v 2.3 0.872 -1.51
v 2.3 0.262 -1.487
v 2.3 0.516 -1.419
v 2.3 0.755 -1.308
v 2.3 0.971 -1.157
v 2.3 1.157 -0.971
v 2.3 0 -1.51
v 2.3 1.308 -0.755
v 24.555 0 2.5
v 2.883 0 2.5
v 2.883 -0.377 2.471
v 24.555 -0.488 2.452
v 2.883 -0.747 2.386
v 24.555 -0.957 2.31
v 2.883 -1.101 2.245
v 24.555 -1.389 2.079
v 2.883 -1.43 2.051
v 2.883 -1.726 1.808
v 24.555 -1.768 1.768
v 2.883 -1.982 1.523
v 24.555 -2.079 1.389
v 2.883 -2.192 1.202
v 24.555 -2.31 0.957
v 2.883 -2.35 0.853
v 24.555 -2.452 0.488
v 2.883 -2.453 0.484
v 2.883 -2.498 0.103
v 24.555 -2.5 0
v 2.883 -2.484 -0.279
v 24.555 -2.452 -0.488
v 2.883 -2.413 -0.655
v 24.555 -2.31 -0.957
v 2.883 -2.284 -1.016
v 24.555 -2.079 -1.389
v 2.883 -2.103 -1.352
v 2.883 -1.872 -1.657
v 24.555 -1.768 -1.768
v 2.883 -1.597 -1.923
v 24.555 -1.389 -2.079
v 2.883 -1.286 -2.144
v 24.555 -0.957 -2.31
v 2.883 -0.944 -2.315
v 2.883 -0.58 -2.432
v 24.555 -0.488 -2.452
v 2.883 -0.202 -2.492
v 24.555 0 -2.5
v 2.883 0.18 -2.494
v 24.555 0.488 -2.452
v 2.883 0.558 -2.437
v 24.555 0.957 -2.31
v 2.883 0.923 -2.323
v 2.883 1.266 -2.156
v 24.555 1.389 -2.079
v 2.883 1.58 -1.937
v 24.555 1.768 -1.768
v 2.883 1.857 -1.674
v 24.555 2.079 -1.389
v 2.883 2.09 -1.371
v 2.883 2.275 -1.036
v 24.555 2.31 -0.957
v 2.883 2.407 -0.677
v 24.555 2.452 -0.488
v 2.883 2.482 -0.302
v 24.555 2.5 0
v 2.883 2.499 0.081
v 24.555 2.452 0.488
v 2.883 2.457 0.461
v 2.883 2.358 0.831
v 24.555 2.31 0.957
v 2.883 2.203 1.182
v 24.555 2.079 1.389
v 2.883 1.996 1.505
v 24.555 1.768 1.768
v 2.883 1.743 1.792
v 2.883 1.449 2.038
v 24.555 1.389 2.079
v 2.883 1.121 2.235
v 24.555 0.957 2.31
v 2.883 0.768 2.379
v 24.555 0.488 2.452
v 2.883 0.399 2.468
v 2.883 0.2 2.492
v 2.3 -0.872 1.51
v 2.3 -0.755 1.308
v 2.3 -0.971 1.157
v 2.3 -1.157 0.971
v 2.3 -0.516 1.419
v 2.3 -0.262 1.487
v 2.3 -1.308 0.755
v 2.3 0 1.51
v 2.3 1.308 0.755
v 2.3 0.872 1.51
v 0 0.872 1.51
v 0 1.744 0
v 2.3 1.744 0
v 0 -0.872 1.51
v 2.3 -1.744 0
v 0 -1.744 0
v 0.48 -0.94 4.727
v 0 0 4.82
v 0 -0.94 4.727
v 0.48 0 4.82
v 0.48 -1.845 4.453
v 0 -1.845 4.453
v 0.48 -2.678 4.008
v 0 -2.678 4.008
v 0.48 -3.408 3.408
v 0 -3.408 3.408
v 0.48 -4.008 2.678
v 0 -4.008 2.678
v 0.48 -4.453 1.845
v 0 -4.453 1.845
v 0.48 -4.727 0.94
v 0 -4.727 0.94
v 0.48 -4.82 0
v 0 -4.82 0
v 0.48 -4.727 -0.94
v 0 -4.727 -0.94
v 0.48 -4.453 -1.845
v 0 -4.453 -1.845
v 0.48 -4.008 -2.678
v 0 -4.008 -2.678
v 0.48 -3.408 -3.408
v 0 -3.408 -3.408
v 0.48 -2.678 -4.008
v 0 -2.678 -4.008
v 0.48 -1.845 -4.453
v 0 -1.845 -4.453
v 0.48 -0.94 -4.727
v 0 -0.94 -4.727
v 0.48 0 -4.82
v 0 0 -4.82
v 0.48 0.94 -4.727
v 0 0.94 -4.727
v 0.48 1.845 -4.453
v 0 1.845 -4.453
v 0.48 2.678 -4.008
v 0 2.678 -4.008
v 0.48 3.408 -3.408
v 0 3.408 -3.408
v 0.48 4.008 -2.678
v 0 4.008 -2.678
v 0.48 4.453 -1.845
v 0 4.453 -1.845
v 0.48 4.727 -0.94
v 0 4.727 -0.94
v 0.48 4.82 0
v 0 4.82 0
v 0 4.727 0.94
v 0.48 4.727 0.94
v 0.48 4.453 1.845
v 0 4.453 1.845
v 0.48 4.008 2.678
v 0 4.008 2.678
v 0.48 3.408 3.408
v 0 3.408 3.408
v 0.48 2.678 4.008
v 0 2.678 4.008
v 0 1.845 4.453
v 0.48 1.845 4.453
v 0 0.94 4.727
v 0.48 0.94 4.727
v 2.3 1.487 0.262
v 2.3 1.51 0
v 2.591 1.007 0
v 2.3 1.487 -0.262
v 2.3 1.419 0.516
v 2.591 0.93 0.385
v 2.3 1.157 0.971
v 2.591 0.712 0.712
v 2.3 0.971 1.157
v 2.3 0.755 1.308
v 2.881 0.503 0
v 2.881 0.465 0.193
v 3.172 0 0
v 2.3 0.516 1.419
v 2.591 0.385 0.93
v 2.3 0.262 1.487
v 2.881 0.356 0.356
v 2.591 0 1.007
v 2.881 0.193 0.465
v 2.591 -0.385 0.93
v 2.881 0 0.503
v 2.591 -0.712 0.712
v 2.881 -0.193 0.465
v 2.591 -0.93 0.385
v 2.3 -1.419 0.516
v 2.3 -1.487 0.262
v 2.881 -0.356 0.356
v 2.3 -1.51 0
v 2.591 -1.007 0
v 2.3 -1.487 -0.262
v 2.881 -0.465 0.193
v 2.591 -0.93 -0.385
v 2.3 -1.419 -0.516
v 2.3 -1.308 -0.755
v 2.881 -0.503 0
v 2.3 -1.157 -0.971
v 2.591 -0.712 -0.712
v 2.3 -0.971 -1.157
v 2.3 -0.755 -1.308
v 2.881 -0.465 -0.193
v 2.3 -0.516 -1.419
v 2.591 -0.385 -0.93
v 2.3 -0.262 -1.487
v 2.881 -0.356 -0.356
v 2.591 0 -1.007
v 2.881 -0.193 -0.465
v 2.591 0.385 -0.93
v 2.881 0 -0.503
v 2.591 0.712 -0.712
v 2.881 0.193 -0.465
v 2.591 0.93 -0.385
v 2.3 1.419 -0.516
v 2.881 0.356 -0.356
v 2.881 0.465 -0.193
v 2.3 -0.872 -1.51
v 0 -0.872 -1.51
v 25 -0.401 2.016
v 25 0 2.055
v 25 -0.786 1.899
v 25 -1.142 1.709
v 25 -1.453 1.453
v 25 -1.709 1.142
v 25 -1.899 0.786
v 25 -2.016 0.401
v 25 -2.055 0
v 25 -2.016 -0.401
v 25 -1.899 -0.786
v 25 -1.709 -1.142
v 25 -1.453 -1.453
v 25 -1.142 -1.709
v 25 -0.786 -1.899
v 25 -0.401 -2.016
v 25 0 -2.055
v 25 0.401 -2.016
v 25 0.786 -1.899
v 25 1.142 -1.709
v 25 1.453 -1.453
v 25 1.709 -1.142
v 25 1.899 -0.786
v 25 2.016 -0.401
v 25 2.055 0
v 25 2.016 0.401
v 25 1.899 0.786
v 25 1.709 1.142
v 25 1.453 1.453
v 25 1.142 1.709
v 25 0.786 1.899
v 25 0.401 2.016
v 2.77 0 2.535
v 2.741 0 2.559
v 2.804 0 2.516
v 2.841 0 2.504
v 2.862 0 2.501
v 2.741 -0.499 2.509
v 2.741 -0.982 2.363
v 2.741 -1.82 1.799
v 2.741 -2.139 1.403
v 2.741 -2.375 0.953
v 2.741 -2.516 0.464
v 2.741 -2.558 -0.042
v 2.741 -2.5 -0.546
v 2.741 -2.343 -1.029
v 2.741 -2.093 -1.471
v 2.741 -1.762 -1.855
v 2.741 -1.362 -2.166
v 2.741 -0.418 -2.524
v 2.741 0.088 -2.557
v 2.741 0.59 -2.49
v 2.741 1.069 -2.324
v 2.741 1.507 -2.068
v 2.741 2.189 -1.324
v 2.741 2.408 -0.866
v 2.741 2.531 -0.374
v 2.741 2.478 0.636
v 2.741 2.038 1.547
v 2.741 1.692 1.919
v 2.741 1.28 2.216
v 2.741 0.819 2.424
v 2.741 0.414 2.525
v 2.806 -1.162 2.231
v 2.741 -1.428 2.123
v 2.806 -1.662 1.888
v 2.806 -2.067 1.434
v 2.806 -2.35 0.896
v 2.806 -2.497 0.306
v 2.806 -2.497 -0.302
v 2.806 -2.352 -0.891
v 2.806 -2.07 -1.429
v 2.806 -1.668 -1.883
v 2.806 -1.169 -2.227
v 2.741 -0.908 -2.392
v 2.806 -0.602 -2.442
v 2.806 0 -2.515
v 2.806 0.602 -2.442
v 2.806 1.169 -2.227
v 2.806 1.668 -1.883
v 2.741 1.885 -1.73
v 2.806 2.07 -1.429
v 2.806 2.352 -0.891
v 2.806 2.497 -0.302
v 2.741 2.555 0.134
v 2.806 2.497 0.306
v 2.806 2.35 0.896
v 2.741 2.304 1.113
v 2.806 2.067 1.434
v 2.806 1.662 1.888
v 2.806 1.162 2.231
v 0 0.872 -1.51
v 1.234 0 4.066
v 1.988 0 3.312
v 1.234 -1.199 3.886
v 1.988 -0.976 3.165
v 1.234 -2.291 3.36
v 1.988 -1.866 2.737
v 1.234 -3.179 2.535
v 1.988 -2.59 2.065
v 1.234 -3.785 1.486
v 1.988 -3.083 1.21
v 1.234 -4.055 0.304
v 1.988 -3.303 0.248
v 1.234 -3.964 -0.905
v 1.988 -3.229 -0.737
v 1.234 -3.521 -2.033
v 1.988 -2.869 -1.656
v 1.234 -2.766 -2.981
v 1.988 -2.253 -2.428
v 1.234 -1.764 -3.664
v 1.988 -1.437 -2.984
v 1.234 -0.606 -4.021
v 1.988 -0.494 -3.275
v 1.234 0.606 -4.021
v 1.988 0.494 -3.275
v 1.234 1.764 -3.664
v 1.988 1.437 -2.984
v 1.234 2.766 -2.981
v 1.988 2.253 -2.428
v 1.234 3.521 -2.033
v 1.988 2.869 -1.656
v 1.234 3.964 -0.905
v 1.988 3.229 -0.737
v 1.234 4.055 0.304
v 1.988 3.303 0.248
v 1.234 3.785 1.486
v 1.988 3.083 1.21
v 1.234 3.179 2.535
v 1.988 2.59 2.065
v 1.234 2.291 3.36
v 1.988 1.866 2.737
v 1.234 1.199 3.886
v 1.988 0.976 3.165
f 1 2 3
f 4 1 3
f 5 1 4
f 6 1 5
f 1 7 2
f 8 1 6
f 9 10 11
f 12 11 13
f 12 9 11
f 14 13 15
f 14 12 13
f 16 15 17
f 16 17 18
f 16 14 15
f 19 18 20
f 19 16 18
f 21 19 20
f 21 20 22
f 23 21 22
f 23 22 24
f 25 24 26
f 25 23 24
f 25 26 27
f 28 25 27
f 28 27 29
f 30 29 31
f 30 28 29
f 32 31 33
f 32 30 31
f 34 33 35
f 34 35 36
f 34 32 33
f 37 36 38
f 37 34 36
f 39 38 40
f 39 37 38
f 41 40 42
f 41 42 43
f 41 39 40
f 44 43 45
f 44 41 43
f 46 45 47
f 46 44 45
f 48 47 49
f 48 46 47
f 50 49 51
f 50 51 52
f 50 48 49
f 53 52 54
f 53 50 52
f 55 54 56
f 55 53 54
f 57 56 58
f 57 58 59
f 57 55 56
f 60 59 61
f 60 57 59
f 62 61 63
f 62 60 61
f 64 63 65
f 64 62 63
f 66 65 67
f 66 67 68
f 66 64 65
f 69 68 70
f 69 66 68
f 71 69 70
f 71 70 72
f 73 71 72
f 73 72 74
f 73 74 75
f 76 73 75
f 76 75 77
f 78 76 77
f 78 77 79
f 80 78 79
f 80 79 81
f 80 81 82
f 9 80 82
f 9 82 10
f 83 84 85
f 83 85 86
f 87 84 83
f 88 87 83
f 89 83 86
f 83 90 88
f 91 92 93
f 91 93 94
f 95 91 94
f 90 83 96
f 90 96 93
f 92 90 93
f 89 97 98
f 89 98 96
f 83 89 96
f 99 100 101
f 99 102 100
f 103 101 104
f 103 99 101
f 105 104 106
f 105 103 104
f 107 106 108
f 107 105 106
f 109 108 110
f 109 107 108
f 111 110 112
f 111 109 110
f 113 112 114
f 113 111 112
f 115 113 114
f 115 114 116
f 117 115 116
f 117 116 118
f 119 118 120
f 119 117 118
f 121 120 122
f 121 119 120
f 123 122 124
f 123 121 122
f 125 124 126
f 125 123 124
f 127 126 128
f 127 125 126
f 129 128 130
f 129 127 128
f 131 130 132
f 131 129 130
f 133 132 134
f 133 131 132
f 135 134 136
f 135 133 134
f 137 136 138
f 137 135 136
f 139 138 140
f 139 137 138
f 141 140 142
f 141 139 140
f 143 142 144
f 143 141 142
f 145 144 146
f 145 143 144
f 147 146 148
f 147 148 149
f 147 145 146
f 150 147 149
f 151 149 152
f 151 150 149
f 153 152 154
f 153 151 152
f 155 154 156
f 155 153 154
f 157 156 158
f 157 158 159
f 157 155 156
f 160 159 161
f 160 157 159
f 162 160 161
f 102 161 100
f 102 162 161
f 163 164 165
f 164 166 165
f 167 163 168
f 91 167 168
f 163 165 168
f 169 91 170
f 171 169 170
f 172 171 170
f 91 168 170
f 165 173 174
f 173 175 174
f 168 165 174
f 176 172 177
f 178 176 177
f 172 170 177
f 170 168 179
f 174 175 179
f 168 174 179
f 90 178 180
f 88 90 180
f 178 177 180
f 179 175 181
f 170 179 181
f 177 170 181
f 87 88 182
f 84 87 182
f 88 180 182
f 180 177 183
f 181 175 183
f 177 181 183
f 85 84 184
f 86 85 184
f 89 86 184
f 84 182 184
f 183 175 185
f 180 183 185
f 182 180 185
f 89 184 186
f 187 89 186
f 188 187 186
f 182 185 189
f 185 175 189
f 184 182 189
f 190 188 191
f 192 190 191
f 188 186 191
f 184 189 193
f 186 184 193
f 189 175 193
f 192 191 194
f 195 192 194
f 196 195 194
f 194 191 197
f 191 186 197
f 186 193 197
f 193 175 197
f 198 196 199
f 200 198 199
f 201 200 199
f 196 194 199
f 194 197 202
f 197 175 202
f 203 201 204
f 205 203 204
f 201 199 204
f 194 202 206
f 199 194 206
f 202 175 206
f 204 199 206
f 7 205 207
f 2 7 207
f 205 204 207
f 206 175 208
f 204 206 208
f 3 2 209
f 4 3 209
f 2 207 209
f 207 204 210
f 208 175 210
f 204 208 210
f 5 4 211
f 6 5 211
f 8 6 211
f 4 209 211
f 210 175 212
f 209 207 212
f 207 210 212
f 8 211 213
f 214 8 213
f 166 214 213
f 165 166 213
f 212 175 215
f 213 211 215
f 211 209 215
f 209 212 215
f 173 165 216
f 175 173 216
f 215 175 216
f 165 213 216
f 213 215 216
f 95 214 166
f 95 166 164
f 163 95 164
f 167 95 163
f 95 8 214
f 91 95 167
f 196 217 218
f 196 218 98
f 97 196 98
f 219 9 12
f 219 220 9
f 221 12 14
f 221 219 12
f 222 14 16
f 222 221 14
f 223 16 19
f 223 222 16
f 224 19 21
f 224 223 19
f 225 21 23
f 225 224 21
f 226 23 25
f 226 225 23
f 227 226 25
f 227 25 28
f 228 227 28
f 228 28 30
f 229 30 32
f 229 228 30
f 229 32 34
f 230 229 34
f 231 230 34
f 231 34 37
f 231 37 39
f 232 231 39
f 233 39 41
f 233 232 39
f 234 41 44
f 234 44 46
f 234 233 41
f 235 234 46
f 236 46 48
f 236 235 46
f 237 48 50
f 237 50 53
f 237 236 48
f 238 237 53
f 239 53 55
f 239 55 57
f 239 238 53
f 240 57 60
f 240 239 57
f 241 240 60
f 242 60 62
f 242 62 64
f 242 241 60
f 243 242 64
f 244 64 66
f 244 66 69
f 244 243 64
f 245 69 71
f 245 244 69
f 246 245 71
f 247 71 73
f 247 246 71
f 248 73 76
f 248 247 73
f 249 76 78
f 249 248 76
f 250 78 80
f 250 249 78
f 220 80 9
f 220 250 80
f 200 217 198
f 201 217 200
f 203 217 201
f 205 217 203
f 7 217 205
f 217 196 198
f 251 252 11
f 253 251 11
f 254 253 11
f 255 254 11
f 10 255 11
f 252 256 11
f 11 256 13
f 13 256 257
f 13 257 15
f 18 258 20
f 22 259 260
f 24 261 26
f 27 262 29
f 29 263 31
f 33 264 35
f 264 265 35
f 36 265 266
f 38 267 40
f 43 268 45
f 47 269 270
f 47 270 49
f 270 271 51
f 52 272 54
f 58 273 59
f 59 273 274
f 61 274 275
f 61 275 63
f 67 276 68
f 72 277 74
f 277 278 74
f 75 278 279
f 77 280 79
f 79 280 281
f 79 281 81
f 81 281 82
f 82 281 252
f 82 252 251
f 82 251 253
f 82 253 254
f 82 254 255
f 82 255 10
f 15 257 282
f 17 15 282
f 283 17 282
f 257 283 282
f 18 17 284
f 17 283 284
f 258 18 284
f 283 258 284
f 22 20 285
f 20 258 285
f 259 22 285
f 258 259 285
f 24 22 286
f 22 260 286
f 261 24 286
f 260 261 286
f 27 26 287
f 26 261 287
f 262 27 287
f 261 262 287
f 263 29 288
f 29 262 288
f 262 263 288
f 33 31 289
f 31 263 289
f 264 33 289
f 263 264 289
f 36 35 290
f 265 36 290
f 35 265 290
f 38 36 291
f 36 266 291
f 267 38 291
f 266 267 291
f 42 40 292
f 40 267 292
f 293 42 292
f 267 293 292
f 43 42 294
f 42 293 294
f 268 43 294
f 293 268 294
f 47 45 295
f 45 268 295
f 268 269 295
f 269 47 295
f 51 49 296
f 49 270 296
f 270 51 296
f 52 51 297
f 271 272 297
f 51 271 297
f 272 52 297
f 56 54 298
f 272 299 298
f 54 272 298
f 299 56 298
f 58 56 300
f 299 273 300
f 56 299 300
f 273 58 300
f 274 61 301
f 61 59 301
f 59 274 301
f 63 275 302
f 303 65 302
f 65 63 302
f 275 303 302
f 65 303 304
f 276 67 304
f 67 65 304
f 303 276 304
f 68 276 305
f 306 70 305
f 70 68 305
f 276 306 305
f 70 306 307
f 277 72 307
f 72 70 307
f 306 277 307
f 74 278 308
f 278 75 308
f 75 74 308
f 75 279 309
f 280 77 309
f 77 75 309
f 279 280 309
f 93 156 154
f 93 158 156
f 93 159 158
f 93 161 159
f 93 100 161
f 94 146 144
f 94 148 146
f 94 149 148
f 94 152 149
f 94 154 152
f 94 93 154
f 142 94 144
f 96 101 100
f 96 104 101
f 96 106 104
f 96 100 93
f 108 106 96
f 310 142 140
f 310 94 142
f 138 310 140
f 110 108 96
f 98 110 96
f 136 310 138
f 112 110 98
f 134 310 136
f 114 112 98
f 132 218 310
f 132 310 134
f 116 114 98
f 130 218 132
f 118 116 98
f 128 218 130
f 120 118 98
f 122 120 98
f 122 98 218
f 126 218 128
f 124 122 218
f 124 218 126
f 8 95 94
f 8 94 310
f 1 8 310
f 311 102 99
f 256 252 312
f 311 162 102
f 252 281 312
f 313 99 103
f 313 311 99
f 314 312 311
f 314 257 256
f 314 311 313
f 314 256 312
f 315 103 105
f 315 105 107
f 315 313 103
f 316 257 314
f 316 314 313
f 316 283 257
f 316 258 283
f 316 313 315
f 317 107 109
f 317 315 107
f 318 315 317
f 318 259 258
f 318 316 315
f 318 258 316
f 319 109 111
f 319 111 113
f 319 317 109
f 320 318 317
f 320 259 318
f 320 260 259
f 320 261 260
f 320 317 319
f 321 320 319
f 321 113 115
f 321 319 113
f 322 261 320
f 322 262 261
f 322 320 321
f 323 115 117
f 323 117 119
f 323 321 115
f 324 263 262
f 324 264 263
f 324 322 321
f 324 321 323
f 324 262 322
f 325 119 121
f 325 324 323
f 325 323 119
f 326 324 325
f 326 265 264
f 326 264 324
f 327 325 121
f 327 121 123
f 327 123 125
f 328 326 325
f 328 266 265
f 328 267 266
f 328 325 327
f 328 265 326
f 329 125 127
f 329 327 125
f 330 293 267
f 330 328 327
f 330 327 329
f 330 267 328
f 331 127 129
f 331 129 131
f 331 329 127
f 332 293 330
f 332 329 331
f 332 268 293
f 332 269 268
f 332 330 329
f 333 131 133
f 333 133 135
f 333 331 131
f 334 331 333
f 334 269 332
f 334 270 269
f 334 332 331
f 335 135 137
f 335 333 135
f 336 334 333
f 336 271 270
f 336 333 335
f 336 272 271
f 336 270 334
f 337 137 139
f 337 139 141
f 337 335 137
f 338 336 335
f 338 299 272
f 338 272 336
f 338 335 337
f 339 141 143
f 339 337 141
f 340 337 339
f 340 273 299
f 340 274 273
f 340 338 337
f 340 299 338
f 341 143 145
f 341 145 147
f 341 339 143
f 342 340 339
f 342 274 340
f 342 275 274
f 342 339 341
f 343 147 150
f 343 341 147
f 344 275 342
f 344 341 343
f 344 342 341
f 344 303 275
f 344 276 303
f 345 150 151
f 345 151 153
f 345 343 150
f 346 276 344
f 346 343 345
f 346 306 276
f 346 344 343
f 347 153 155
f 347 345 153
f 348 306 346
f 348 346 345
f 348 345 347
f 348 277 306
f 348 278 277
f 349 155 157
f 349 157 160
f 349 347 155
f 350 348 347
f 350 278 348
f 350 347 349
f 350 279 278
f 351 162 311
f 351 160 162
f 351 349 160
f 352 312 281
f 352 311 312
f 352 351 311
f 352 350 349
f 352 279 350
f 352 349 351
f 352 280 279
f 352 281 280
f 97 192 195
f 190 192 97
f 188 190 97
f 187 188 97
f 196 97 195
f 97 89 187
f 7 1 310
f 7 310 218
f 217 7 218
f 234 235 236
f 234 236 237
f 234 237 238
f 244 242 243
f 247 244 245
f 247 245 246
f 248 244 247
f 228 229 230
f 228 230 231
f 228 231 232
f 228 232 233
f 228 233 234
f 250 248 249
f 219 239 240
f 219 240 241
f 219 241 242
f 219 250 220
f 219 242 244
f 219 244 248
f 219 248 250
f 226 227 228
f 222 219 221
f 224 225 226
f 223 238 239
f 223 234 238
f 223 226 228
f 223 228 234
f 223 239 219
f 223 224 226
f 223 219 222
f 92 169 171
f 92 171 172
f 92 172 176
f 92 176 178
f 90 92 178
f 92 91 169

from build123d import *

# Parameters (mm, degrees)
FILLET1_R   = 0.2
HEX_START   = -2.3
HEX_2_DEPTH = 2.3


with BuildPart() as part:
    # BodySke → BaseBody (revolve)
    with BuildSketch(Plane.XY, mode=Mode.PRIVATE) as basebody_sk:
        Polygon((0, 0), (0, 4.82), (0.48, 4.82), (2.8, 2.5), (24.555, 2.5), (25, 2.055), (25, 0), align=None)
    revolve(basebody_sk.sketch.rotate(Axis((0, 0, 0), (1, 0, 0)), 90), axis=Axis((0, 0, 0), (1, 0, 0)))

    # Fillet1
    fillet1_edges = [part.edges().sort_by_distance(p)[0] for p in [
        (2.8, 0, -2.5),
    ]]
    fillet(fillet1_edges, radius=FILLET1_R)

    # Hex 2: read off the stored shape, not the designer's step
    # Hex 2 outline → Hex 2 (cut)
    with BuildSketch(Plane.ZY.offset(HEX_START)):
        Polygon((-1.51, -0.871798906), (0, -1.743597813), (1.51, -0.871798906), (1.51, 0.871798906), (0, 1.743597813), (-1.51, 0.871798906), align=None)
    extrude(amount=HEX_2_DEPTH, mode=Mode.SUBTRACT)

    # Hex 2 2 outline → Hex 2 2 (revolve, cut)
    with BuildSketch(Plane.YX):
        Polygon((1.51, 2.3), (0, 3.171798906), (0, 2.3), align=None)
    revolve(axis=Axis((0, 0, 0), (1, 0, 0)), mode=Mode.SUBTRACT)


solid = part.part
